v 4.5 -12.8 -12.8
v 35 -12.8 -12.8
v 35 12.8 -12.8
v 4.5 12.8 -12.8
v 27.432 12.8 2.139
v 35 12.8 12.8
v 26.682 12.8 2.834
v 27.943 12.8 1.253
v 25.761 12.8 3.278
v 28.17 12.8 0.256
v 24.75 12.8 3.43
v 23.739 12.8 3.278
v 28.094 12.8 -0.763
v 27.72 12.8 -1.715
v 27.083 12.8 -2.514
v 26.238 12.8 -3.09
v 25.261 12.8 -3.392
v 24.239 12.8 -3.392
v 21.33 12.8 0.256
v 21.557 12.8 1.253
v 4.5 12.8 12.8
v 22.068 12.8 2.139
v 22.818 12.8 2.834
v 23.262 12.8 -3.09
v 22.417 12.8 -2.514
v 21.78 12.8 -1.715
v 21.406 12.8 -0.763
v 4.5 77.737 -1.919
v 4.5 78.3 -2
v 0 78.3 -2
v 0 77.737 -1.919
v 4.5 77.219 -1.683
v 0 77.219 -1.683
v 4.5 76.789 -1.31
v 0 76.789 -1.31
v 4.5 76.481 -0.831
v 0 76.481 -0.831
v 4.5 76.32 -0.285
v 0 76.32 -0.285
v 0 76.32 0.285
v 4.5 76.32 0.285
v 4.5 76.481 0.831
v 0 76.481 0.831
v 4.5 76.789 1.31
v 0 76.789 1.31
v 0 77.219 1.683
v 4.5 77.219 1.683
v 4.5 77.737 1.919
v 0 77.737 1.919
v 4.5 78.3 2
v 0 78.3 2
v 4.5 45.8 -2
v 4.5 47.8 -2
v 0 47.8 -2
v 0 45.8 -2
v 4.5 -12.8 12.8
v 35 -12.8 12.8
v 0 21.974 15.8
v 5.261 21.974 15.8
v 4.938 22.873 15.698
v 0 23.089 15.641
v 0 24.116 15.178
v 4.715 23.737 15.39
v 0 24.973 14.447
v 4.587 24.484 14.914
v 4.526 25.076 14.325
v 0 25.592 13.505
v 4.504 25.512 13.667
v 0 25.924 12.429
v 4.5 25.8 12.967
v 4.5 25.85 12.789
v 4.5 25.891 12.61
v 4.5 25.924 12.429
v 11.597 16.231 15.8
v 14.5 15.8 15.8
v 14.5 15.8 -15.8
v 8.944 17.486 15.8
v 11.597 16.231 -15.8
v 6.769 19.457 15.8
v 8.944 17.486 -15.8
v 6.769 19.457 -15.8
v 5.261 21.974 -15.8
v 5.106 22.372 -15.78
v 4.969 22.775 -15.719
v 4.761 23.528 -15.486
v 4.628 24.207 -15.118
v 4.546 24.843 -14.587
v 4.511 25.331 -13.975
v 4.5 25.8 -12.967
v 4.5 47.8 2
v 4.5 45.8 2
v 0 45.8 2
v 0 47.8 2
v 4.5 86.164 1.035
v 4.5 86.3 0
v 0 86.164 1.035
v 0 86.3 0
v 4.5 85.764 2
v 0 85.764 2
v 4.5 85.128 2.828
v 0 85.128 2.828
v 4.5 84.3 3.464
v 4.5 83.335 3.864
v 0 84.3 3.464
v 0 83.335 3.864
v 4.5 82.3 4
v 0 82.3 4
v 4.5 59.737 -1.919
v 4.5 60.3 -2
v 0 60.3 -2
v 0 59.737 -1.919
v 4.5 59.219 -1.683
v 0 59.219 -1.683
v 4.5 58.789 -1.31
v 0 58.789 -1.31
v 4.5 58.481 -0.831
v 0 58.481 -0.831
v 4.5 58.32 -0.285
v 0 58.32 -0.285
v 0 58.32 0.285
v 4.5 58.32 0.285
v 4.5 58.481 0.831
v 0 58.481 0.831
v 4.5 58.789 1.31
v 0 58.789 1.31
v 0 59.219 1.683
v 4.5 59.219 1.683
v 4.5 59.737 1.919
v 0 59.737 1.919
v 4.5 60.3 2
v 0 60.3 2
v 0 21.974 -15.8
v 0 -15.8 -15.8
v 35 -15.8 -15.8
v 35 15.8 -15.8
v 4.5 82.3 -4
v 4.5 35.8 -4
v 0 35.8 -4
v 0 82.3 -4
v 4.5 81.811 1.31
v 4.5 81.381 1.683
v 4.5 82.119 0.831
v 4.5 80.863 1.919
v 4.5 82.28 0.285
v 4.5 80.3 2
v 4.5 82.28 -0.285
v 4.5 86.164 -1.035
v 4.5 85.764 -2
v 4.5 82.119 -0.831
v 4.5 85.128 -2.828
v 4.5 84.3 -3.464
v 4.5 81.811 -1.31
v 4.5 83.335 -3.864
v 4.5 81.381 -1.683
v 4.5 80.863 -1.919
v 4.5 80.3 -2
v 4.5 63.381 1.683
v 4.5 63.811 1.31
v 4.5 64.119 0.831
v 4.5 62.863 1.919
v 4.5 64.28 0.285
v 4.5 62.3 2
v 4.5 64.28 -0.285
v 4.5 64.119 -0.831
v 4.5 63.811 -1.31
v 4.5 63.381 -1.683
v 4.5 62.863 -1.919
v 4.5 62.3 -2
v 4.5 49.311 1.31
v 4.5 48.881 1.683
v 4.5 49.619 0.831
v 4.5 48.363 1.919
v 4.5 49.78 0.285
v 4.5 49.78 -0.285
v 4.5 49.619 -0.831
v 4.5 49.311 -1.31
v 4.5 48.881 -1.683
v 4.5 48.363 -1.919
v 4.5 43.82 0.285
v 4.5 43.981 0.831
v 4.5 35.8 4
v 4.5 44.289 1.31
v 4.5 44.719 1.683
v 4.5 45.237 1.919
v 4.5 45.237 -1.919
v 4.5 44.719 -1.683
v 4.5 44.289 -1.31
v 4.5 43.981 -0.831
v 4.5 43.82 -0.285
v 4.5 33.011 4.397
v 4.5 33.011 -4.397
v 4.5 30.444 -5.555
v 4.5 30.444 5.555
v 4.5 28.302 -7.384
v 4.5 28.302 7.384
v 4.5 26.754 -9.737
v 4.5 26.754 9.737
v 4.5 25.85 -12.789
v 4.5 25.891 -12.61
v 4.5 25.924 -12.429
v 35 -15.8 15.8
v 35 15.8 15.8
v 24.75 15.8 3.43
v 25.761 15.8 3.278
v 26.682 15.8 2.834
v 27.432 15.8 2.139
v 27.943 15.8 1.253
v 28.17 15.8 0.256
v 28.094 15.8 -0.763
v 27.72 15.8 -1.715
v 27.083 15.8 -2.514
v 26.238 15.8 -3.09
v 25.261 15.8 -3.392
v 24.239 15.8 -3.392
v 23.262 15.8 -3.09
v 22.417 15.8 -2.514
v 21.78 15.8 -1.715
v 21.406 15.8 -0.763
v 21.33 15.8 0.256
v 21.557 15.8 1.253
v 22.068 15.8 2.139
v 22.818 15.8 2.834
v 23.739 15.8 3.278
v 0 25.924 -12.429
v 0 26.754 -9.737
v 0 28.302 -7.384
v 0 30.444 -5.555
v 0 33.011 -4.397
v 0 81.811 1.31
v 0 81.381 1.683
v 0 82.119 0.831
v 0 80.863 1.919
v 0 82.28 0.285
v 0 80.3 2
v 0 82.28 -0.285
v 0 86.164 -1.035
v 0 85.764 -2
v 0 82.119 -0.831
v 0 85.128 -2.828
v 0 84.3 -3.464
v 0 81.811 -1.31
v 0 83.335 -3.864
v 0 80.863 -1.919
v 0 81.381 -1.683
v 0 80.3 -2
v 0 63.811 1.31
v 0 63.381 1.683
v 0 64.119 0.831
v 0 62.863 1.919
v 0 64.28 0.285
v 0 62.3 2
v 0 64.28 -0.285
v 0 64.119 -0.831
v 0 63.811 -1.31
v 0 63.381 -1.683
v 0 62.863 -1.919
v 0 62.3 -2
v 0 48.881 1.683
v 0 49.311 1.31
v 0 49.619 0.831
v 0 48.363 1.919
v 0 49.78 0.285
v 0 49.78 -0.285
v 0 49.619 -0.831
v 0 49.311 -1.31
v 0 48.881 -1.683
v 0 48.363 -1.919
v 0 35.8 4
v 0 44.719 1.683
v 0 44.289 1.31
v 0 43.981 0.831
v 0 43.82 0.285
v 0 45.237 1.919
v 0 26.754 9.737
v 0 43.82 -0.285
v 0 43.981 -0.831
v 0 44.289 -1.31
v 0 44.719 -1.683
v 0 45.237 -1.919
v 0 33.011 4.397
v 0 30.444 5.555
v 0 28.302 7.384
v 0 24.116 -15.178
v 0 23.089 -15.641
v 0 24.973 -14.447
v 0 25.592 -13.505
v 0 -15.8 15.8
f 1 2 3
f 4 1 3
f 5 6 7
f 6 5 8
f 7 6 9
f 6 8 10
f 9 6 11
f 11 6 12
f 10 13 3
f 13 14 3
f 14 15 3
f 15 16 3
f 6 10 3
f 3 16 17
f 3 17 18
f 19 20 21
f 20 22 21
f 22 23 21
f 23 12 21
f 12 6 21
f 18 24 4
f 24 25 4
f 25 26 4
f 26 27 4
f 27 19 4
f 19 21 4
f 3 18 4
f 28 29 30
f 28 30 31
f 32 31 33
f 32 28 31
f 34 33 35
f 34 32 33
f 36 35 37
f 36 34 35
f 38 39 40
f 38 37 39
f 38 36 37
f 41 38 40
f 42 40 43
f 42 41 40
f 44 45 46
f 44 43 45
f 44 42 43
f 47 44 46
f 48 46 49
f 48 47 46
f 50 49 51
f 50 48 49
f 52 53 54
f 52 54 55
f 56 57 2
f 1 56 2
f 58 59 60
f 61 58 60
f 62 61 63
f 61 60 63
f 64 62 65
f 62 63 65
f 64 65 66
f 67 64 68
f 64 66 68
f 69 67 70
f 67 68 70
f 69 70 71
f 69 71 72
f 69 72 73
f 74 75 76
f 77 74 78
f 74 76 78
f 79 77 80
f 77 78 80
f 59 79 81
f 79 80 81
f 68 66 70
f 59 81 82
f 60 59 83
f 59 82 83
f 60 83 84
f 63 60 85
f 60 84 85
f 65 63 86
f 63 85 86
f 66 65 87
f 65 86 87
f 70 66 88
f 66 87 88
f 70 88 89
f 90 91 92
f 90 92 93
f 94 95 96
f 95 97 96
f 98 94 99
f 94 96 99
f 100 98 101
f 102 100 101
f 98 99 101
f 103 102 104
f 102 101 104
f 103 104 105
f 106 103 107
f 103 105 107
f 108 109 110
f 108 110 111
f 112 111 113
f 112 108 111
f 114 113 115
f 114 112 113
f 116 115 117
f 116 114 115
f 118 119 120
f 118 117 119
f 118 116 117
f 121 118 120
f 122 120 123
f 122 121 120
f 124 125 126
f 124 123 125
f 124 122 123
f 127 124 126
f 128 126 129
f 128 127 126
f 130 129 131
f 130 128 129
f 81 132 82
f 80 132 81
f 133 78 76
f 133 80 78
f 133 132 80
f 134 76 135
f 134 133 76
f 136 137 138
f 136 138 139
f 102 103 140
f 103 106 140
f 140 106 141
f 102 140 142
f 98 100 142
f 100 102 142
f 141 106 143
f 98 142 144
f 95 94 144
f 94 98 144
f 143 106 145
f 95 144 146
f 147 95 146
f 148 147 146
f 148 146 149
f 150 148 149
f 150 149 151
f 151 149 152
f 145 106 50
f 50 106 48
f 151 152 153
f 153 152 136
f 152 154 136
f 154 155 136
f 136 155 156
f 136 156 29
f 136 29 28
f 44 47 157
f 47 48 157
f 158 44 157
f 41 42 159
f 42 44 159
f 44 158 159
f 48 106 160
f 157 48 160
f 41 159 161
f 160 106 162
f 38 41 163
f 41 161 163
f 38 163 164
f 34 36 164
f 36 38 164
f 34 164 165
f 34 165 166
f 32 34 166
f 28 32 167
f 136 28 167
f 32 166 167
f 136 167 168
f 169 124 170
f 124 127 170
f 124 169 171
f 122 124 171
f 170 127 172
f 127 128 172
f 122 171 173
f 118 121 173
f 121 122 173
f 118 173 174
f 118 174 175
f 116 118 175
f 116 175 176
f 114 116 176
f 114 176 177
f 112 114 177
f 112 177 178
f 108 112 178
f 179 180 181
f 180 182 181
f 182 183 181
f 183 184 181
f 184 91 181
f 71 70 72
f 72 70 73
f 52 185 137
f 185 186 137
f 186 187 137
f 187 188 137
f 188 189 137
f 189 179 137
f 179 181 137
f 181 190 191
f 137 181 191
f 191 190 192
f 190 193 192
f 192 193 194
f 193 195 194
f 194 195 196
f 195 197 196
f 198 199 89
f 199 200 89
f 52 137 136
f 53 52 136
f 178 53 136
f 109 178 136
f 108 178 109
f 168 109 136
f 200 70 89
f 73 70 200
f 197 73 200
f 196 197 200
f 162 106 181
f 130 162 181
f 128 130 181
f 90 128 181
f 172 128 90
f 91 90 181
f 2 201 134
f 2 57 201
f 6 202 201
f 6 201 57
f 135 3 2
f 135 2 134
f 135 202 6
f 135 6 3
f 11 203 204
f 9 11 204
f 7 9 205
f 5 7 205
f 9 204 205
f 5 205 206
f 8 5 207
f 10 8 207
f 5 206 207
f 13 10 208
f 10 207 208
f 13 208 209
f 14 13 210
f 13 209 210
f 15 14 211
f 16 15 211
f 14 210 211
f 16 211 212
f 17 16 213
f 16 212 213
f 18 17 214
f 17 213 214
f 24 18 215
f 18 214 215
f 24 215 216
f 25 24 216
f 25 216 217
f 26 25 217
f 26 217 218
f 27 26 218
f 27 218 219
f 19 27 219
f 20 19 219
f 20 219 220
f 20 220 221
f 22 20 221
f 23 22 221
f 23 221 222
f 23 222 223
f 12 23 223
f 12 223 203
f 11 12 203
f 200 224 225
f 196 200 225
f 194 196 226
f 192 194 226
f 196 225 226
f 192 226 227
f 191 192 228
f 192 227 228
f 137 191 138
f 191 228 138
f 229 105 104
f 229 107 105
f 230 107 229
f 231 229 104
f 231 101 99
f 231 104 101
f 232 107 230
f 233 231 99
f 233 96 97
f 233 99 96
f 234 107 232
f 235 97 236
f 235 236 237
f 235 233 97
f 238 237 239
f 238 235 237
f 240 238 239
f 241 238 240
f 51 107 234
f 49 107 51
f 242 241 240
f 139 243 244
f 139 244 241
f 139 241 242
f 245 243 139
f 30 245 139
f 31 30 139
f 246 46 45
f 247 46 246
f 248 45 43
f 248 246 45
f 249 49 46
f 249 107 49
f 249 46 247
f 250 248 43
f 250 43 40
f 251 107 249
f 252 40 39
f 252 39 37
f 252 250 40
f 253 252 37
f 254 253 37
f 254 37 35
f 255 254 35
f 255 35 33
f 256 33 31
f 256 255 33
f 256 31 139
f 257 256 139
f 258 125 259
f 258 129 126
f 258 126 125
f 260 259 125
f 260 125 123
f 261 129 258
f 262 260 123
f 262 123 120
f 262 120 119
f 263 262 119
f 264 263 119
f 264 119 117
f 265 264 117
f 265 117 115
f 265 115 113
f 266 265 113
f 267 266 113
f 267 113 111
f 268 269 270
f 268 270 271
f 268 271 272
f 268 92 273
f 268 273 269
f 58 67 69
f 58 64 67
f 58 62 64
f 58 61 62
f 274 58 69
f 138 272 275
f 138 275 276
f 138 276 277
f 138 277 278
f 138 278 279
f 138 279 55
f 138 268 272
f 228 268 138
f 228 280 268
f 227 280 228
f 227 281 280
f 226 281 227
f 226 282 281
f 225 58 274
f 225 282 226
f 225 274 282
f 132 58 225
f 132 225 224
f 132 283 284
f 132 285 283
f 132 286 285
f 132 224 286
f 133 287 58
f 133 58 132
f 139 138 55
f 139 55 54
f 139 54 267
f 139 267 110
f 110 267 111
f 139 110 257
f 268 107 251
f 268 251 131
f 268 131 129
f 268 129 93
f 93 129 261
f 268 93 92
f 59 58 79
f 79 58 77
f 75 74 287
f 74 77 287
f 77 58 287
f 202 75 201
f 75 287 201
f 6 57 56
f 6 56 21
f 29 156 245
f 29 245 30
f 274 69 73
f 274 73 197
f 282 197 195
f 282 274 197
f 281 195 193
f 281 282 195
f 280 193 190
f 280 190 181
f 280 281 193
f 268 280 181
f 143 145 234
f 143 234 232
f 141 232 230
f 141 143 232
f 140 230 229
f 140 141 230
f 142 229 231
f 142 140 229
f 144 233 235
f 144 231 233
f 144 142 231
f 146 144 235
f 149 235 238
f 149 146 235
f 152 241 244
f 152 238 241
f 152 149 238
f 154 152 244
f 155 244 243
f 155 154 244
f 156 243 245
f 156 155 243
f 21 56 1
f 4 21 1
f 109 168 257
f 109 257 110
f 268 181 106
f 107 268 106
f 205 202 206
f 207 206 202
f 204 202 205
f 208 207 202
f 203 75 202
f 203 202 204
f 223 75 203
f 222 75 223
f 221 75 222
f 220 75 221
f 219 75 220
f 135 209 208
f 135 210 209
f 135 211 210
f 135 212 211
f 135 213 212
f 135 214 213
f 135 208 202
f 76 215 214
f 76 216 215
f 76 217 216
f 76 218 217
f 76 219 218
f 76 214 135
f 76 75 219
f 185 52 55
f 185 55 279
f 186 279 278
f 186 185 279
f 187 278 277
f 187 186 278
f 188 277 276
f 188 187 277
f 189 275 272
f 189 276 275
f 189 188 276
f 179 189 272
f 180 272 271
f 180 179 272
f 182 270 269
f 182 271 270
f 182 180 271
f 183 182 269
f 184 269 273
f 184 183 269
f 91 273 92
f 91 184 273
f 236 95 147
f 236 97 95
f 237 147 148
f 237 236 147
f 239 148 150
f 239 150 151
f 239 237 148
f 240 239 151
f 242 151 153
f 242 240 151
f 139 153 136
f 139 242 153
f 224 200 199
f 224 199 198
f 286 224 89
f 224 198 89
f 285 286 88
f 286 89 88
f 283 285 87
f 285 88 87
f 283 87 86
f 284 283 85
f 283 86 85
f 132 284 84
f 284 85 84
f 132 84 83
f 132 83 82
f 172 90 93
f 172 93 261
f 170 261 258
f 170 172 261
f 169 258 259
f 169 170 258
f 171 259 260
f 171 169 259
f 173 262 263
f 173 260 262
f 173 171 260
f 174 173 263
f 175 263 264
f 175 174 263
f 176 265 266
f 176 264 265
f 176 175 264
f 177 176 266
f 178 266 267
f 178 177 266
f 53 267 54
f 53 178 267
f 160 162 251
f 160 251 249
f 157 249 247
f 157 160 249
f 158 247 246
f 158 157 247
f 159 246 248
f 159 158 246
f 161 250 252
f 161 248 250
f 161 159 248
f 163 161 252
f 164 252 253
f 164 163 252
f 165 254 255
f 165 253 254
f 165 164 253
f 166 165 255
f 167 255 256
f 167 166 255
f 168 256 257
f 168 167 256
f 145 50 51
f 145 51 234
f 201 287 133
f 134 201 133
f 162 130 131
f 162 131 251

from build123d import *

# Parameters (mm, degrees)
SKETCH1_W           = 31.6
SKETCH1_H           = 31.6
SKETCH1_W_2         = 25.6
SKETCH1_H_2         = 25.6
BOSS_EXTRUDE1_DEPTH = 35
SKETCH2_W           = 4.5
SKETCH2_H           = 31.6
BOSS_EXTRUDE2_DEPTH = 70.5
FILLET1_R           = 10
SKETCH3_W           = 11.8
SKETCH3_H           = 60.5
CUT_EXTRUDE1_DEPTH  = 13
FILLET2_R           = 10
FILLET3_R           = 4
FILLET4_R           = 4
FILLET5_R           = 4
FILLET6_R           = 4
SKETCH4_R           = 3.43
CUT_EXTRUDE2_DEPTH  = 13
SKETCH6_W           = 4.5
SKETCH6_H           = 25.6
BOSS_EXTRUDE3_DEPTH = 26


# Some blends are built 0.0001 mm under size
with BuildPart() as part:
    # Sketch1 → Boss-Extrude1 (new body)
    with BuildSketch(Plane(origin=(0, 0, 0), x_dir=(0, 0, -1), z_dir=(1, 0, 0))):
        Rectangle(SKETCH1_W, SKETCH1_H)
        Rectangle(SKETCH1_W_2, SKETCH1_H_2, mode=Mode.SUBTRACT)
    extrude(amount=BOSS_EXTRUDE1_DEPTH)

    # Sketch2 → Boss-Extrude2 (add)
    with BuildSketch(Plane(origin=(0, 15.8, 0), x_dir=(1, 0, 0), z_dir=(0, 1, 0))):
        with Locations((2.25, 0)):
            Rectangle(SKETCH2_W, SKETCH2_H)
    extrude(amount=BOSS_EXTRUDE2_DEPTH)

    # Fillet1
    fillet1_edges = [part.edges().sort_by_distance(p)[0] for p in [
        (4.5, 15.8, 0),
    ]]
    fillet(fillet1_edges, radius=FILLET1_R)

    # Sketch3 → Cut-Extrude1 (cut)
    with BuildSketch(Plane(origin=(4.5, 0, 0), x_dir=(0, 0, -1), z_dir=(1, 0, 0))):
        with BuildLine():
            Line((-2, 45.8), (-2, 47.8))
            ThreePointArc((-2, 47.8), (0, 49.8), (2, 47.8))
            Line((2, 47.8), (2, 45.8))
            ThreePointArc((2, 45.8), (0, 43.8), (-2, 45.8))
        make_face()
        with BuildLine():
            Line((-2, 60.3), (-2, 62.3))
            ThreePointArc((-2, 62.3), (0, 64.3), (2, 62.3))
            Line((2, 62.3), (2, 60.3))
            ThreePointArc((2, 60.3), (0, 58.3), (-2, 60.3))
        make_face()
        with BuildLine():
            Line((-2, 78.3), (-2, 80.3))
            ThreePointArc((-2, 80.3), (0, 82.3), (2, 80.3))
            Line((2, 80.3), (2, 78.3))
            ThreePointArc((2, 78.3), (0, 76.3), (-2, 78.3))
        make_face()
        with Locations((-9.9, 56.05)):
            Rectangle(SKETCH3_W, SKETCH3_H)
        with Locations((9.9, 56.05)):
            Rectangle(SKETCH3_W, SKETCH3_H)
    extrude(amount=-CUT_EXTRUDE1_DEPTH, mode=Mode.SUBTRACT)

    # Fillet2
    fillet2_edges = [part.edges().sort_by_distance(p)[0] for p in [
        (2.25, 25.8, 4),
        (2.25, 25.8, -4),
    ]]
    fillet(fillet2_edges, radius=FILLET2_R)

    # Fillet3
    fillet3_edges = [part.edges().sort_by_distance(p)[0] for p in [
        (2.25, 86.3, 4),
    ]]
    fillet(fillet3_edges, radius=FILLET3_R)

    # Fillet4
    fillet4_edges = [part.edges().sort_by_distance(p)[0] for p in [
        (2.25, 86.3, -4),
    ]]
    fillet(fillet4_edges, radius=FILLET4_R - 0.0001)  # a hair under: the kernel refuses the full size

    # Fillet5
    # the kernel refuses this fillet: 4 mm, written as the material it takes off along each edge
    with BuildSketch(Plane(origin=(14.065155865, 25.8, 15.8), x_dir=(0, 0.03682620114116805, -0.9993216853994064), z_dir=(-1, 0, 0))) as fillet5_piece_1:
        with BuildLine():
            CenterArc((3.8563874, 3.970771877), FILLET5_R, 182.110463108, 80.958903851)
            Line((-0.140899342, 3.823467072), (-0.540628016, 3.808736592))
            Line((-0.540628016, 3.808736592), (-0.399728674, -0.01473048))
            Line((-0.399728674, -0.01473048), (0.01473048, -0.399728674))
            ThreePointArc((0.01473048, -0.399728674), (1.813509514, -0.333441512), (3.325449974, -0.397077188))
            Line((3.325449974, -0.397077188), (3.373717013, 0))
        make_face()
    extrude(amount=23.630311731, mode=Mode.SUBTRACT)

    # Fillet6
    # the kernel refuses this fillet: 4 mm, written as the material it takes off along each edge
    with BuildSketch(Plane(origin=(14.065155865, 25.8, -15.8), x_dir=(0, 0.03682620114116807, 0.9993216853994065), z_dir=(-1, 0, 0))) as fillet6_piece_1:
        with BuildLine():
            CenterArc((3.8563874, -3.970771877), FILLET6_R, 96.93063304, 80.958903851)
            Line((-0.140899342, -3.823467072), (-0.540628016, -3.808736592))
            Line((-0.540628016, -3.808736592), (-0.399728674, 0.01473048))
            Line((-0.399728674, 0.01473048), (0.01473048, 0.399728674))
            ThreePointArc((0.01473048, 0.399728674), (1.813509514, 0.333441512), (3.325449974, 0.397077188))
            Line((3.325449974, 0.397077188), (3.373717013, 0))
        make_face()
    extrude(amount=23.630311731, mode=Mode.SUBTRACT)

    # Sketch4 → Cut-Extrude2 (cut)
    with BuildSketch(Plane(origin=(0, 15.8, 0), x_dir=(1, 0, 0), z_dir=(0, 1, 0))):
        with Locations(Location((24.75, 0, 0), (0, 0, 270))):
            Circle(SKETCH4_R)
    extrude(amount=-CUT_EXTRUDE2_DEPTH, mode=Mode.SUBTRACT)

    # Sketch6 → Boss-Extrude3 (add)
    with BuildSketch(Plane(origin=(0, -12.8, 0), x_dir=(1, 0, 0), z_dir=(0, 1, 0))):
        with Locations((2.25, 0)):
            Rectangle(SKETCH6_W, SKETCH6_H)
    extrude(amount=BOSS_EXTRUDE3_DEPTH)


solid = part.part
